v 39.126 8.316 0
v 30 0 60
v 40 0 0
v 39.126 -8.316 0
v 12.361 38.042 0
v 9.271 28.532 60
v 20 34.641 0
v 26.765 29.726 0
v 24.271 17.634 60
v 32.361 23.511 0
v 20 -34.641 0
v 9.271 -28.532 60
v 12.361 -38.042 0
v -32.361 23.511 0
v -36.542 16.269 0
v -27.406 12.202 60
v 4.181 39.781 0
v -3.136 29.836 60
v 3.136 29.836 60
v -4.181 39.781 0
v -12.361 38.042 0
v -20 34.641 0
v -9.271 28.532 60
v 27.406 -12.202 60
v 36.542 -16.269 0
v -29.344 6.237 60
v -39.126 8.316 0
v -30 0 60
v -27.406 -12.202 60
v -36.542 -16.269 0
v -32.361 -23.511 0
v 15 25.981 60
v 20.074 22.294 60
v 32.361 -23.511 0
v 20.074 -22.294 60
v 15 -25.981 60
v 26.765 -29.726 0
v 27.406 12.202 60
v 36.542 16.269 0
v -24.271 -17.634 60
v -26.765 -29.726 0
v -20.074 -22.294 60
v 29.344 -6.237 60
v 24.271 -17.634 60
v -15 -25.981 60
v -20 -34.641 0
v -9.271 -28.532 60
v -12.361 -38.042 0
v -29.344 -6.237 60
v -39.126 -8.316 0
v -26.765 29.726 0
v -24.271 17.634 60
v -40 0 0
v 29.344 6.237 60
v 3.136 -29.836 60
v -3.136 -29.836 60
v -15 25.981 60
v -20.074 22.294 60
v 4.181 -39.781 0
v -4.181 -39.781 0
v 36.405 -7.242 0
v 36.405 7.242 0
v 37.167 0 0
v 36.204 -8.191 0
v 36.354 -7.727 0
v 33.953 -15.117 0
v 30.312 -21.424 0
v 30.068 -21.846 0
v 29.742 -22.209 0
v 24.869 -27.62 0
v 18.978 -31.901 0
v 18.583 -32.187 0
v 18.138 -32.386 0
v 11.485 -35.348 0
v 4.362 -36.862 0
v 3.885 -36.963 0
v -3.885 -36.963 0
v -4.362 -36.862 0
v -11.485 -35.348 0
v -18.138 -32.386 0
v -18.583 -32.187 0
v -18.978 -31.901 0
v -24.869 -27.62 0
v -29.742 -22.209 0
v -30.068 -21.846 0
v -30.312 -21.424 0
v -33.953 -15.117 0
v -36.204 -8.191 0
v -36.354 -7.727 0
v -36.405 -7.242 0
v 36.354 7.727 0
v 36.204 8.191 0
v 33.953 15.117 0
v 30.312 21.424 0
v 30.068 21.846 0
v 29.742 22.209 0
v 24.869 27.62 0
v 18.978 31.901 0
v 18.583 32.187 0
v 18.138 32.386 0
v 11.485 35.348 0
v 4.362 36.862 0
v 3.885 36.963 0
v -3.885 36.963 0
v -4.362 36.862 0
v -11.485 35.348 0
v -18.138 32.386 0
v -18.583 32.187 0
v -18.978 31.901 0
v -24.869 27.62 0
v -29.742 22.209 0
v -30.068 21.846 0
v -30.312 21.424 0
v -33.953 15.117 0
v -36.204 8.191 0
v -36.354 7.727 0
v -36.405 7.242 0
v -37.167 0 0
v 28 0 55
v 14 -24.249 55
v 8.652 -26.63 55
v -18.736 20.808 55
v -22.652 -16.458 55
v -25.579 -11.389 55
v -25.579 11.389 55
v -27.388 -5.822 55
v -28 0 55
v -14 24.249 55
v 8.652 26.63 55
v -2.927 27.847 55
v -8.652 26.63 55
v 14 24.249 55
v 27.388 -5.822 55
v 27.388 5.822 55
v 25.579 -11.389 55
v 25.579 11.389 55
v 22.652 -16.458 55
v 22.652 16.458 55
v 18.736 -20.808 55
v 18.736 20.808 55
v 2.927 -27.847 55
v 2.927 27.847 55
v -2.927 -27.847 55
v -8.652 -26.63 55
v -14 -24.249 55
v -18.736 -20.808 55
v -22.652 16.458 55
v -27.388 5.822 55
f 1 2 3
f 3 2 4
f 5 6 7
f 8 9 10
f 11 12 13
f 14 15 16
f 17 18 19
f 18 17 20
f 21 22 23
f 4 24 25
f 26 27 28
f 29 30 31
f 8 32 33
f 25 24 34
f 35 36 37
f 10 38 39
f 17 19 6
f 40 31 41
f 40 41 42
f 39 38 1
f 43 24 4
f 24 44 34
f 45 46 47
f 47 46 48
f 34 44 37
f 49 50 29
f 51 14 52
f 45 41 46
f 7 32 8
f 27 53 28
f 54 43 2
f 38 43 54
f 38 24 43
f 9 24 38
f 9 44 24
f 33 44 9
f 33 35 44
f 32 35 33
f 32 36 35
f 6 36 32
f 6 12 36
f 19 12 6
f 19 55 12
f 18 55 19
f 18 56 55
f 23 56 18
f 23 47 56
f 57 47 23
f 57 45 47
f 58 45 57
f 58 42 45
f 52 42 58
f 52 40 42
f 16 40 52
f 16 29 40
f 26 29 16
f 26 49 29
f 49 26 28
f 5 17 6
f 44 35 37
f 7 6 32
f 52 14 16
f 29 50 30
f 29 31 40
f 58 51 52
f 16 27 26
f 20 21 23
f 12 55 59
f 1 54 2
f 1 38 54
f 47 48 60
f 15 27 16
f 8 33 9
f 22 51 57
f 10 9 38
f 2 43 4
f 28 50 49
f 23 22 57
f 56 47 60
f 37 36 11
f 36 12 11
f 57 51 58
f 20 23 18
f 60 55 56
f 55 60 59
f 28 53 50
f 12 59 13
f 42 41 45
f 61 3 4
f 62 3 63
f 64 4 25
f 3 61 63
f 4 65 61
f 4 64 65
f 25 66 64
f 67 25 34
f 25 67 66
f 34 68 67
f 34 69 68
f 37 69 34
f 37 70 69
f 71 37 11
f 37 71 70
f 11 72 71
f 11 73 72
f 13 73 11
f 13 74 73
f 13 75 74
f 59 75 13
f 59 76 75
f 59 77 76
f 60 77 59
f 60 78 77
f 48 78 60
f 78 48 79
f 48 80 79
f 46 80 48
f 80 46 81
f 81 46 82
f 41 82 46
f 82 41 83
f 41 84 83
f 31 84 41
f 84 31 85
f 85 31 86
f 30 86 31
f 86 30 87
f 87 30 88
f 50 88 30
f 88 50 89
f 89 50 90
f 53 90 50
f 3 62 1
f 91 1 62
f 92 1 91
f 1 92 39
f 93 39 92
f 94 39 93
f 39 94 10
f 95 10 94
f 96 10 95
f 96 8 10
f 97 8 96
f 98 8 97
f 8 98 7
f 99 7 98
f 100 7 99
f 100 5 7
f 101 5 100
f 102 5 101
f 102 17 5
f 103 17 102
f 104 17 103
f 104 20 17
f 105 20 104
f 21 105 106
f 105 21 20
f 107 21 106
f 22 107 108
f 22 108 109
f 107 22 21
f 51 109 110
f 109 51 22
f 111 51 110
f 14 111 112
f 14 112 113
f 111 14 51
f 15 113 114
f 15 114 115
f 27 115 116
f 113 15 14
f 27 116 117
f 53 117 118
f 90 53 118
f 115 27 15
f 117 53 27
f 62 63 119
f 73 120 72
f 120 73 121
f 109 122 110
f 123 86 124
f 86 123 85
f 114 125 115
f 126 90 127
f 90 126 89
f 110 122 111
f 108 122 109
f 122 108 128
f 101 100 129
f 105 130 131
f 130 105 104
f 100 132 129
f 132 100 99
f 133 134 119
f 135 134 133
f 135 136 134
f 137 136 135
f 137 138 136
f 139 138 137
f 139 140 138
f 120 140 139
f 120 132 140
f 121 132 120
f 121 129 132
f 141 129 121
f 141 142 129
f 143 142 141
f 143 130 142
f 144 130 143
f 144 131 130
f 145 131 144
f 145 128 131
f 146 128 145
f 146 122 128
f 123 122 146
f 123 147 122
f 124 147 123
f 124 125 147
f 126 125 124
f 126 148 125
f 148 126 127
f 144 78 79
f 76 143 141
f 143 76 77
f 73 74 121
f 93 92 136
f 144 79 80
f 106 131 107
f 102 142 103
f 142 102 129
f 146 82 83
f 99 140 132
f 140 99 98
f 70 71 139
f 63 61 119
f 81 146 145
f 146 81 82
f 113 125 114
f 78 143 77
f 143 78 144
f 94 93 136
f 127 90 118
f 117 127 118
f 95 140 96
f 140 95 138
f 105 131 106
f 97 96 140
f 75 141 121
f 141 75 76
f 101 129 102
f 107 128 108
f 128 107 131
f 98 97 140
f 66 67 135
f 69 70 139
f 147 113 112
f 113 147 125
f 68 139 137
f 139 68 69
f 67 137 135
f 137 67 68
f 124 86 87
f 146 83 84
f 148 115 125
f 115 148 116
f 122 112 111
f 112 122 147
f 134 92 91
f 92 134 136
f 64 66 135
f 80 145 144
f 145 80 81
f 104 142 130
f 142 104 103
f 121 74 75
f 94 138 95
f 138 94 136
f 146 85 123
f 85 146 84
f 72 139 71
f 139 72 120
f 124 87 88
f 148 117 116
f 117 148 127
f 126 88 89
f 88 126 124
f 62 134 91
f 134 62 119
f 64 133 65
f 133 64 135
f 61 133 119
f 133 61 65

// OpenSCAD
LampShade();


module LampShade()
{
    difference()
    {
        cylinder(60,40,30);
        translate([0,0,-5])cylinder(60,38,28);
    }
}
